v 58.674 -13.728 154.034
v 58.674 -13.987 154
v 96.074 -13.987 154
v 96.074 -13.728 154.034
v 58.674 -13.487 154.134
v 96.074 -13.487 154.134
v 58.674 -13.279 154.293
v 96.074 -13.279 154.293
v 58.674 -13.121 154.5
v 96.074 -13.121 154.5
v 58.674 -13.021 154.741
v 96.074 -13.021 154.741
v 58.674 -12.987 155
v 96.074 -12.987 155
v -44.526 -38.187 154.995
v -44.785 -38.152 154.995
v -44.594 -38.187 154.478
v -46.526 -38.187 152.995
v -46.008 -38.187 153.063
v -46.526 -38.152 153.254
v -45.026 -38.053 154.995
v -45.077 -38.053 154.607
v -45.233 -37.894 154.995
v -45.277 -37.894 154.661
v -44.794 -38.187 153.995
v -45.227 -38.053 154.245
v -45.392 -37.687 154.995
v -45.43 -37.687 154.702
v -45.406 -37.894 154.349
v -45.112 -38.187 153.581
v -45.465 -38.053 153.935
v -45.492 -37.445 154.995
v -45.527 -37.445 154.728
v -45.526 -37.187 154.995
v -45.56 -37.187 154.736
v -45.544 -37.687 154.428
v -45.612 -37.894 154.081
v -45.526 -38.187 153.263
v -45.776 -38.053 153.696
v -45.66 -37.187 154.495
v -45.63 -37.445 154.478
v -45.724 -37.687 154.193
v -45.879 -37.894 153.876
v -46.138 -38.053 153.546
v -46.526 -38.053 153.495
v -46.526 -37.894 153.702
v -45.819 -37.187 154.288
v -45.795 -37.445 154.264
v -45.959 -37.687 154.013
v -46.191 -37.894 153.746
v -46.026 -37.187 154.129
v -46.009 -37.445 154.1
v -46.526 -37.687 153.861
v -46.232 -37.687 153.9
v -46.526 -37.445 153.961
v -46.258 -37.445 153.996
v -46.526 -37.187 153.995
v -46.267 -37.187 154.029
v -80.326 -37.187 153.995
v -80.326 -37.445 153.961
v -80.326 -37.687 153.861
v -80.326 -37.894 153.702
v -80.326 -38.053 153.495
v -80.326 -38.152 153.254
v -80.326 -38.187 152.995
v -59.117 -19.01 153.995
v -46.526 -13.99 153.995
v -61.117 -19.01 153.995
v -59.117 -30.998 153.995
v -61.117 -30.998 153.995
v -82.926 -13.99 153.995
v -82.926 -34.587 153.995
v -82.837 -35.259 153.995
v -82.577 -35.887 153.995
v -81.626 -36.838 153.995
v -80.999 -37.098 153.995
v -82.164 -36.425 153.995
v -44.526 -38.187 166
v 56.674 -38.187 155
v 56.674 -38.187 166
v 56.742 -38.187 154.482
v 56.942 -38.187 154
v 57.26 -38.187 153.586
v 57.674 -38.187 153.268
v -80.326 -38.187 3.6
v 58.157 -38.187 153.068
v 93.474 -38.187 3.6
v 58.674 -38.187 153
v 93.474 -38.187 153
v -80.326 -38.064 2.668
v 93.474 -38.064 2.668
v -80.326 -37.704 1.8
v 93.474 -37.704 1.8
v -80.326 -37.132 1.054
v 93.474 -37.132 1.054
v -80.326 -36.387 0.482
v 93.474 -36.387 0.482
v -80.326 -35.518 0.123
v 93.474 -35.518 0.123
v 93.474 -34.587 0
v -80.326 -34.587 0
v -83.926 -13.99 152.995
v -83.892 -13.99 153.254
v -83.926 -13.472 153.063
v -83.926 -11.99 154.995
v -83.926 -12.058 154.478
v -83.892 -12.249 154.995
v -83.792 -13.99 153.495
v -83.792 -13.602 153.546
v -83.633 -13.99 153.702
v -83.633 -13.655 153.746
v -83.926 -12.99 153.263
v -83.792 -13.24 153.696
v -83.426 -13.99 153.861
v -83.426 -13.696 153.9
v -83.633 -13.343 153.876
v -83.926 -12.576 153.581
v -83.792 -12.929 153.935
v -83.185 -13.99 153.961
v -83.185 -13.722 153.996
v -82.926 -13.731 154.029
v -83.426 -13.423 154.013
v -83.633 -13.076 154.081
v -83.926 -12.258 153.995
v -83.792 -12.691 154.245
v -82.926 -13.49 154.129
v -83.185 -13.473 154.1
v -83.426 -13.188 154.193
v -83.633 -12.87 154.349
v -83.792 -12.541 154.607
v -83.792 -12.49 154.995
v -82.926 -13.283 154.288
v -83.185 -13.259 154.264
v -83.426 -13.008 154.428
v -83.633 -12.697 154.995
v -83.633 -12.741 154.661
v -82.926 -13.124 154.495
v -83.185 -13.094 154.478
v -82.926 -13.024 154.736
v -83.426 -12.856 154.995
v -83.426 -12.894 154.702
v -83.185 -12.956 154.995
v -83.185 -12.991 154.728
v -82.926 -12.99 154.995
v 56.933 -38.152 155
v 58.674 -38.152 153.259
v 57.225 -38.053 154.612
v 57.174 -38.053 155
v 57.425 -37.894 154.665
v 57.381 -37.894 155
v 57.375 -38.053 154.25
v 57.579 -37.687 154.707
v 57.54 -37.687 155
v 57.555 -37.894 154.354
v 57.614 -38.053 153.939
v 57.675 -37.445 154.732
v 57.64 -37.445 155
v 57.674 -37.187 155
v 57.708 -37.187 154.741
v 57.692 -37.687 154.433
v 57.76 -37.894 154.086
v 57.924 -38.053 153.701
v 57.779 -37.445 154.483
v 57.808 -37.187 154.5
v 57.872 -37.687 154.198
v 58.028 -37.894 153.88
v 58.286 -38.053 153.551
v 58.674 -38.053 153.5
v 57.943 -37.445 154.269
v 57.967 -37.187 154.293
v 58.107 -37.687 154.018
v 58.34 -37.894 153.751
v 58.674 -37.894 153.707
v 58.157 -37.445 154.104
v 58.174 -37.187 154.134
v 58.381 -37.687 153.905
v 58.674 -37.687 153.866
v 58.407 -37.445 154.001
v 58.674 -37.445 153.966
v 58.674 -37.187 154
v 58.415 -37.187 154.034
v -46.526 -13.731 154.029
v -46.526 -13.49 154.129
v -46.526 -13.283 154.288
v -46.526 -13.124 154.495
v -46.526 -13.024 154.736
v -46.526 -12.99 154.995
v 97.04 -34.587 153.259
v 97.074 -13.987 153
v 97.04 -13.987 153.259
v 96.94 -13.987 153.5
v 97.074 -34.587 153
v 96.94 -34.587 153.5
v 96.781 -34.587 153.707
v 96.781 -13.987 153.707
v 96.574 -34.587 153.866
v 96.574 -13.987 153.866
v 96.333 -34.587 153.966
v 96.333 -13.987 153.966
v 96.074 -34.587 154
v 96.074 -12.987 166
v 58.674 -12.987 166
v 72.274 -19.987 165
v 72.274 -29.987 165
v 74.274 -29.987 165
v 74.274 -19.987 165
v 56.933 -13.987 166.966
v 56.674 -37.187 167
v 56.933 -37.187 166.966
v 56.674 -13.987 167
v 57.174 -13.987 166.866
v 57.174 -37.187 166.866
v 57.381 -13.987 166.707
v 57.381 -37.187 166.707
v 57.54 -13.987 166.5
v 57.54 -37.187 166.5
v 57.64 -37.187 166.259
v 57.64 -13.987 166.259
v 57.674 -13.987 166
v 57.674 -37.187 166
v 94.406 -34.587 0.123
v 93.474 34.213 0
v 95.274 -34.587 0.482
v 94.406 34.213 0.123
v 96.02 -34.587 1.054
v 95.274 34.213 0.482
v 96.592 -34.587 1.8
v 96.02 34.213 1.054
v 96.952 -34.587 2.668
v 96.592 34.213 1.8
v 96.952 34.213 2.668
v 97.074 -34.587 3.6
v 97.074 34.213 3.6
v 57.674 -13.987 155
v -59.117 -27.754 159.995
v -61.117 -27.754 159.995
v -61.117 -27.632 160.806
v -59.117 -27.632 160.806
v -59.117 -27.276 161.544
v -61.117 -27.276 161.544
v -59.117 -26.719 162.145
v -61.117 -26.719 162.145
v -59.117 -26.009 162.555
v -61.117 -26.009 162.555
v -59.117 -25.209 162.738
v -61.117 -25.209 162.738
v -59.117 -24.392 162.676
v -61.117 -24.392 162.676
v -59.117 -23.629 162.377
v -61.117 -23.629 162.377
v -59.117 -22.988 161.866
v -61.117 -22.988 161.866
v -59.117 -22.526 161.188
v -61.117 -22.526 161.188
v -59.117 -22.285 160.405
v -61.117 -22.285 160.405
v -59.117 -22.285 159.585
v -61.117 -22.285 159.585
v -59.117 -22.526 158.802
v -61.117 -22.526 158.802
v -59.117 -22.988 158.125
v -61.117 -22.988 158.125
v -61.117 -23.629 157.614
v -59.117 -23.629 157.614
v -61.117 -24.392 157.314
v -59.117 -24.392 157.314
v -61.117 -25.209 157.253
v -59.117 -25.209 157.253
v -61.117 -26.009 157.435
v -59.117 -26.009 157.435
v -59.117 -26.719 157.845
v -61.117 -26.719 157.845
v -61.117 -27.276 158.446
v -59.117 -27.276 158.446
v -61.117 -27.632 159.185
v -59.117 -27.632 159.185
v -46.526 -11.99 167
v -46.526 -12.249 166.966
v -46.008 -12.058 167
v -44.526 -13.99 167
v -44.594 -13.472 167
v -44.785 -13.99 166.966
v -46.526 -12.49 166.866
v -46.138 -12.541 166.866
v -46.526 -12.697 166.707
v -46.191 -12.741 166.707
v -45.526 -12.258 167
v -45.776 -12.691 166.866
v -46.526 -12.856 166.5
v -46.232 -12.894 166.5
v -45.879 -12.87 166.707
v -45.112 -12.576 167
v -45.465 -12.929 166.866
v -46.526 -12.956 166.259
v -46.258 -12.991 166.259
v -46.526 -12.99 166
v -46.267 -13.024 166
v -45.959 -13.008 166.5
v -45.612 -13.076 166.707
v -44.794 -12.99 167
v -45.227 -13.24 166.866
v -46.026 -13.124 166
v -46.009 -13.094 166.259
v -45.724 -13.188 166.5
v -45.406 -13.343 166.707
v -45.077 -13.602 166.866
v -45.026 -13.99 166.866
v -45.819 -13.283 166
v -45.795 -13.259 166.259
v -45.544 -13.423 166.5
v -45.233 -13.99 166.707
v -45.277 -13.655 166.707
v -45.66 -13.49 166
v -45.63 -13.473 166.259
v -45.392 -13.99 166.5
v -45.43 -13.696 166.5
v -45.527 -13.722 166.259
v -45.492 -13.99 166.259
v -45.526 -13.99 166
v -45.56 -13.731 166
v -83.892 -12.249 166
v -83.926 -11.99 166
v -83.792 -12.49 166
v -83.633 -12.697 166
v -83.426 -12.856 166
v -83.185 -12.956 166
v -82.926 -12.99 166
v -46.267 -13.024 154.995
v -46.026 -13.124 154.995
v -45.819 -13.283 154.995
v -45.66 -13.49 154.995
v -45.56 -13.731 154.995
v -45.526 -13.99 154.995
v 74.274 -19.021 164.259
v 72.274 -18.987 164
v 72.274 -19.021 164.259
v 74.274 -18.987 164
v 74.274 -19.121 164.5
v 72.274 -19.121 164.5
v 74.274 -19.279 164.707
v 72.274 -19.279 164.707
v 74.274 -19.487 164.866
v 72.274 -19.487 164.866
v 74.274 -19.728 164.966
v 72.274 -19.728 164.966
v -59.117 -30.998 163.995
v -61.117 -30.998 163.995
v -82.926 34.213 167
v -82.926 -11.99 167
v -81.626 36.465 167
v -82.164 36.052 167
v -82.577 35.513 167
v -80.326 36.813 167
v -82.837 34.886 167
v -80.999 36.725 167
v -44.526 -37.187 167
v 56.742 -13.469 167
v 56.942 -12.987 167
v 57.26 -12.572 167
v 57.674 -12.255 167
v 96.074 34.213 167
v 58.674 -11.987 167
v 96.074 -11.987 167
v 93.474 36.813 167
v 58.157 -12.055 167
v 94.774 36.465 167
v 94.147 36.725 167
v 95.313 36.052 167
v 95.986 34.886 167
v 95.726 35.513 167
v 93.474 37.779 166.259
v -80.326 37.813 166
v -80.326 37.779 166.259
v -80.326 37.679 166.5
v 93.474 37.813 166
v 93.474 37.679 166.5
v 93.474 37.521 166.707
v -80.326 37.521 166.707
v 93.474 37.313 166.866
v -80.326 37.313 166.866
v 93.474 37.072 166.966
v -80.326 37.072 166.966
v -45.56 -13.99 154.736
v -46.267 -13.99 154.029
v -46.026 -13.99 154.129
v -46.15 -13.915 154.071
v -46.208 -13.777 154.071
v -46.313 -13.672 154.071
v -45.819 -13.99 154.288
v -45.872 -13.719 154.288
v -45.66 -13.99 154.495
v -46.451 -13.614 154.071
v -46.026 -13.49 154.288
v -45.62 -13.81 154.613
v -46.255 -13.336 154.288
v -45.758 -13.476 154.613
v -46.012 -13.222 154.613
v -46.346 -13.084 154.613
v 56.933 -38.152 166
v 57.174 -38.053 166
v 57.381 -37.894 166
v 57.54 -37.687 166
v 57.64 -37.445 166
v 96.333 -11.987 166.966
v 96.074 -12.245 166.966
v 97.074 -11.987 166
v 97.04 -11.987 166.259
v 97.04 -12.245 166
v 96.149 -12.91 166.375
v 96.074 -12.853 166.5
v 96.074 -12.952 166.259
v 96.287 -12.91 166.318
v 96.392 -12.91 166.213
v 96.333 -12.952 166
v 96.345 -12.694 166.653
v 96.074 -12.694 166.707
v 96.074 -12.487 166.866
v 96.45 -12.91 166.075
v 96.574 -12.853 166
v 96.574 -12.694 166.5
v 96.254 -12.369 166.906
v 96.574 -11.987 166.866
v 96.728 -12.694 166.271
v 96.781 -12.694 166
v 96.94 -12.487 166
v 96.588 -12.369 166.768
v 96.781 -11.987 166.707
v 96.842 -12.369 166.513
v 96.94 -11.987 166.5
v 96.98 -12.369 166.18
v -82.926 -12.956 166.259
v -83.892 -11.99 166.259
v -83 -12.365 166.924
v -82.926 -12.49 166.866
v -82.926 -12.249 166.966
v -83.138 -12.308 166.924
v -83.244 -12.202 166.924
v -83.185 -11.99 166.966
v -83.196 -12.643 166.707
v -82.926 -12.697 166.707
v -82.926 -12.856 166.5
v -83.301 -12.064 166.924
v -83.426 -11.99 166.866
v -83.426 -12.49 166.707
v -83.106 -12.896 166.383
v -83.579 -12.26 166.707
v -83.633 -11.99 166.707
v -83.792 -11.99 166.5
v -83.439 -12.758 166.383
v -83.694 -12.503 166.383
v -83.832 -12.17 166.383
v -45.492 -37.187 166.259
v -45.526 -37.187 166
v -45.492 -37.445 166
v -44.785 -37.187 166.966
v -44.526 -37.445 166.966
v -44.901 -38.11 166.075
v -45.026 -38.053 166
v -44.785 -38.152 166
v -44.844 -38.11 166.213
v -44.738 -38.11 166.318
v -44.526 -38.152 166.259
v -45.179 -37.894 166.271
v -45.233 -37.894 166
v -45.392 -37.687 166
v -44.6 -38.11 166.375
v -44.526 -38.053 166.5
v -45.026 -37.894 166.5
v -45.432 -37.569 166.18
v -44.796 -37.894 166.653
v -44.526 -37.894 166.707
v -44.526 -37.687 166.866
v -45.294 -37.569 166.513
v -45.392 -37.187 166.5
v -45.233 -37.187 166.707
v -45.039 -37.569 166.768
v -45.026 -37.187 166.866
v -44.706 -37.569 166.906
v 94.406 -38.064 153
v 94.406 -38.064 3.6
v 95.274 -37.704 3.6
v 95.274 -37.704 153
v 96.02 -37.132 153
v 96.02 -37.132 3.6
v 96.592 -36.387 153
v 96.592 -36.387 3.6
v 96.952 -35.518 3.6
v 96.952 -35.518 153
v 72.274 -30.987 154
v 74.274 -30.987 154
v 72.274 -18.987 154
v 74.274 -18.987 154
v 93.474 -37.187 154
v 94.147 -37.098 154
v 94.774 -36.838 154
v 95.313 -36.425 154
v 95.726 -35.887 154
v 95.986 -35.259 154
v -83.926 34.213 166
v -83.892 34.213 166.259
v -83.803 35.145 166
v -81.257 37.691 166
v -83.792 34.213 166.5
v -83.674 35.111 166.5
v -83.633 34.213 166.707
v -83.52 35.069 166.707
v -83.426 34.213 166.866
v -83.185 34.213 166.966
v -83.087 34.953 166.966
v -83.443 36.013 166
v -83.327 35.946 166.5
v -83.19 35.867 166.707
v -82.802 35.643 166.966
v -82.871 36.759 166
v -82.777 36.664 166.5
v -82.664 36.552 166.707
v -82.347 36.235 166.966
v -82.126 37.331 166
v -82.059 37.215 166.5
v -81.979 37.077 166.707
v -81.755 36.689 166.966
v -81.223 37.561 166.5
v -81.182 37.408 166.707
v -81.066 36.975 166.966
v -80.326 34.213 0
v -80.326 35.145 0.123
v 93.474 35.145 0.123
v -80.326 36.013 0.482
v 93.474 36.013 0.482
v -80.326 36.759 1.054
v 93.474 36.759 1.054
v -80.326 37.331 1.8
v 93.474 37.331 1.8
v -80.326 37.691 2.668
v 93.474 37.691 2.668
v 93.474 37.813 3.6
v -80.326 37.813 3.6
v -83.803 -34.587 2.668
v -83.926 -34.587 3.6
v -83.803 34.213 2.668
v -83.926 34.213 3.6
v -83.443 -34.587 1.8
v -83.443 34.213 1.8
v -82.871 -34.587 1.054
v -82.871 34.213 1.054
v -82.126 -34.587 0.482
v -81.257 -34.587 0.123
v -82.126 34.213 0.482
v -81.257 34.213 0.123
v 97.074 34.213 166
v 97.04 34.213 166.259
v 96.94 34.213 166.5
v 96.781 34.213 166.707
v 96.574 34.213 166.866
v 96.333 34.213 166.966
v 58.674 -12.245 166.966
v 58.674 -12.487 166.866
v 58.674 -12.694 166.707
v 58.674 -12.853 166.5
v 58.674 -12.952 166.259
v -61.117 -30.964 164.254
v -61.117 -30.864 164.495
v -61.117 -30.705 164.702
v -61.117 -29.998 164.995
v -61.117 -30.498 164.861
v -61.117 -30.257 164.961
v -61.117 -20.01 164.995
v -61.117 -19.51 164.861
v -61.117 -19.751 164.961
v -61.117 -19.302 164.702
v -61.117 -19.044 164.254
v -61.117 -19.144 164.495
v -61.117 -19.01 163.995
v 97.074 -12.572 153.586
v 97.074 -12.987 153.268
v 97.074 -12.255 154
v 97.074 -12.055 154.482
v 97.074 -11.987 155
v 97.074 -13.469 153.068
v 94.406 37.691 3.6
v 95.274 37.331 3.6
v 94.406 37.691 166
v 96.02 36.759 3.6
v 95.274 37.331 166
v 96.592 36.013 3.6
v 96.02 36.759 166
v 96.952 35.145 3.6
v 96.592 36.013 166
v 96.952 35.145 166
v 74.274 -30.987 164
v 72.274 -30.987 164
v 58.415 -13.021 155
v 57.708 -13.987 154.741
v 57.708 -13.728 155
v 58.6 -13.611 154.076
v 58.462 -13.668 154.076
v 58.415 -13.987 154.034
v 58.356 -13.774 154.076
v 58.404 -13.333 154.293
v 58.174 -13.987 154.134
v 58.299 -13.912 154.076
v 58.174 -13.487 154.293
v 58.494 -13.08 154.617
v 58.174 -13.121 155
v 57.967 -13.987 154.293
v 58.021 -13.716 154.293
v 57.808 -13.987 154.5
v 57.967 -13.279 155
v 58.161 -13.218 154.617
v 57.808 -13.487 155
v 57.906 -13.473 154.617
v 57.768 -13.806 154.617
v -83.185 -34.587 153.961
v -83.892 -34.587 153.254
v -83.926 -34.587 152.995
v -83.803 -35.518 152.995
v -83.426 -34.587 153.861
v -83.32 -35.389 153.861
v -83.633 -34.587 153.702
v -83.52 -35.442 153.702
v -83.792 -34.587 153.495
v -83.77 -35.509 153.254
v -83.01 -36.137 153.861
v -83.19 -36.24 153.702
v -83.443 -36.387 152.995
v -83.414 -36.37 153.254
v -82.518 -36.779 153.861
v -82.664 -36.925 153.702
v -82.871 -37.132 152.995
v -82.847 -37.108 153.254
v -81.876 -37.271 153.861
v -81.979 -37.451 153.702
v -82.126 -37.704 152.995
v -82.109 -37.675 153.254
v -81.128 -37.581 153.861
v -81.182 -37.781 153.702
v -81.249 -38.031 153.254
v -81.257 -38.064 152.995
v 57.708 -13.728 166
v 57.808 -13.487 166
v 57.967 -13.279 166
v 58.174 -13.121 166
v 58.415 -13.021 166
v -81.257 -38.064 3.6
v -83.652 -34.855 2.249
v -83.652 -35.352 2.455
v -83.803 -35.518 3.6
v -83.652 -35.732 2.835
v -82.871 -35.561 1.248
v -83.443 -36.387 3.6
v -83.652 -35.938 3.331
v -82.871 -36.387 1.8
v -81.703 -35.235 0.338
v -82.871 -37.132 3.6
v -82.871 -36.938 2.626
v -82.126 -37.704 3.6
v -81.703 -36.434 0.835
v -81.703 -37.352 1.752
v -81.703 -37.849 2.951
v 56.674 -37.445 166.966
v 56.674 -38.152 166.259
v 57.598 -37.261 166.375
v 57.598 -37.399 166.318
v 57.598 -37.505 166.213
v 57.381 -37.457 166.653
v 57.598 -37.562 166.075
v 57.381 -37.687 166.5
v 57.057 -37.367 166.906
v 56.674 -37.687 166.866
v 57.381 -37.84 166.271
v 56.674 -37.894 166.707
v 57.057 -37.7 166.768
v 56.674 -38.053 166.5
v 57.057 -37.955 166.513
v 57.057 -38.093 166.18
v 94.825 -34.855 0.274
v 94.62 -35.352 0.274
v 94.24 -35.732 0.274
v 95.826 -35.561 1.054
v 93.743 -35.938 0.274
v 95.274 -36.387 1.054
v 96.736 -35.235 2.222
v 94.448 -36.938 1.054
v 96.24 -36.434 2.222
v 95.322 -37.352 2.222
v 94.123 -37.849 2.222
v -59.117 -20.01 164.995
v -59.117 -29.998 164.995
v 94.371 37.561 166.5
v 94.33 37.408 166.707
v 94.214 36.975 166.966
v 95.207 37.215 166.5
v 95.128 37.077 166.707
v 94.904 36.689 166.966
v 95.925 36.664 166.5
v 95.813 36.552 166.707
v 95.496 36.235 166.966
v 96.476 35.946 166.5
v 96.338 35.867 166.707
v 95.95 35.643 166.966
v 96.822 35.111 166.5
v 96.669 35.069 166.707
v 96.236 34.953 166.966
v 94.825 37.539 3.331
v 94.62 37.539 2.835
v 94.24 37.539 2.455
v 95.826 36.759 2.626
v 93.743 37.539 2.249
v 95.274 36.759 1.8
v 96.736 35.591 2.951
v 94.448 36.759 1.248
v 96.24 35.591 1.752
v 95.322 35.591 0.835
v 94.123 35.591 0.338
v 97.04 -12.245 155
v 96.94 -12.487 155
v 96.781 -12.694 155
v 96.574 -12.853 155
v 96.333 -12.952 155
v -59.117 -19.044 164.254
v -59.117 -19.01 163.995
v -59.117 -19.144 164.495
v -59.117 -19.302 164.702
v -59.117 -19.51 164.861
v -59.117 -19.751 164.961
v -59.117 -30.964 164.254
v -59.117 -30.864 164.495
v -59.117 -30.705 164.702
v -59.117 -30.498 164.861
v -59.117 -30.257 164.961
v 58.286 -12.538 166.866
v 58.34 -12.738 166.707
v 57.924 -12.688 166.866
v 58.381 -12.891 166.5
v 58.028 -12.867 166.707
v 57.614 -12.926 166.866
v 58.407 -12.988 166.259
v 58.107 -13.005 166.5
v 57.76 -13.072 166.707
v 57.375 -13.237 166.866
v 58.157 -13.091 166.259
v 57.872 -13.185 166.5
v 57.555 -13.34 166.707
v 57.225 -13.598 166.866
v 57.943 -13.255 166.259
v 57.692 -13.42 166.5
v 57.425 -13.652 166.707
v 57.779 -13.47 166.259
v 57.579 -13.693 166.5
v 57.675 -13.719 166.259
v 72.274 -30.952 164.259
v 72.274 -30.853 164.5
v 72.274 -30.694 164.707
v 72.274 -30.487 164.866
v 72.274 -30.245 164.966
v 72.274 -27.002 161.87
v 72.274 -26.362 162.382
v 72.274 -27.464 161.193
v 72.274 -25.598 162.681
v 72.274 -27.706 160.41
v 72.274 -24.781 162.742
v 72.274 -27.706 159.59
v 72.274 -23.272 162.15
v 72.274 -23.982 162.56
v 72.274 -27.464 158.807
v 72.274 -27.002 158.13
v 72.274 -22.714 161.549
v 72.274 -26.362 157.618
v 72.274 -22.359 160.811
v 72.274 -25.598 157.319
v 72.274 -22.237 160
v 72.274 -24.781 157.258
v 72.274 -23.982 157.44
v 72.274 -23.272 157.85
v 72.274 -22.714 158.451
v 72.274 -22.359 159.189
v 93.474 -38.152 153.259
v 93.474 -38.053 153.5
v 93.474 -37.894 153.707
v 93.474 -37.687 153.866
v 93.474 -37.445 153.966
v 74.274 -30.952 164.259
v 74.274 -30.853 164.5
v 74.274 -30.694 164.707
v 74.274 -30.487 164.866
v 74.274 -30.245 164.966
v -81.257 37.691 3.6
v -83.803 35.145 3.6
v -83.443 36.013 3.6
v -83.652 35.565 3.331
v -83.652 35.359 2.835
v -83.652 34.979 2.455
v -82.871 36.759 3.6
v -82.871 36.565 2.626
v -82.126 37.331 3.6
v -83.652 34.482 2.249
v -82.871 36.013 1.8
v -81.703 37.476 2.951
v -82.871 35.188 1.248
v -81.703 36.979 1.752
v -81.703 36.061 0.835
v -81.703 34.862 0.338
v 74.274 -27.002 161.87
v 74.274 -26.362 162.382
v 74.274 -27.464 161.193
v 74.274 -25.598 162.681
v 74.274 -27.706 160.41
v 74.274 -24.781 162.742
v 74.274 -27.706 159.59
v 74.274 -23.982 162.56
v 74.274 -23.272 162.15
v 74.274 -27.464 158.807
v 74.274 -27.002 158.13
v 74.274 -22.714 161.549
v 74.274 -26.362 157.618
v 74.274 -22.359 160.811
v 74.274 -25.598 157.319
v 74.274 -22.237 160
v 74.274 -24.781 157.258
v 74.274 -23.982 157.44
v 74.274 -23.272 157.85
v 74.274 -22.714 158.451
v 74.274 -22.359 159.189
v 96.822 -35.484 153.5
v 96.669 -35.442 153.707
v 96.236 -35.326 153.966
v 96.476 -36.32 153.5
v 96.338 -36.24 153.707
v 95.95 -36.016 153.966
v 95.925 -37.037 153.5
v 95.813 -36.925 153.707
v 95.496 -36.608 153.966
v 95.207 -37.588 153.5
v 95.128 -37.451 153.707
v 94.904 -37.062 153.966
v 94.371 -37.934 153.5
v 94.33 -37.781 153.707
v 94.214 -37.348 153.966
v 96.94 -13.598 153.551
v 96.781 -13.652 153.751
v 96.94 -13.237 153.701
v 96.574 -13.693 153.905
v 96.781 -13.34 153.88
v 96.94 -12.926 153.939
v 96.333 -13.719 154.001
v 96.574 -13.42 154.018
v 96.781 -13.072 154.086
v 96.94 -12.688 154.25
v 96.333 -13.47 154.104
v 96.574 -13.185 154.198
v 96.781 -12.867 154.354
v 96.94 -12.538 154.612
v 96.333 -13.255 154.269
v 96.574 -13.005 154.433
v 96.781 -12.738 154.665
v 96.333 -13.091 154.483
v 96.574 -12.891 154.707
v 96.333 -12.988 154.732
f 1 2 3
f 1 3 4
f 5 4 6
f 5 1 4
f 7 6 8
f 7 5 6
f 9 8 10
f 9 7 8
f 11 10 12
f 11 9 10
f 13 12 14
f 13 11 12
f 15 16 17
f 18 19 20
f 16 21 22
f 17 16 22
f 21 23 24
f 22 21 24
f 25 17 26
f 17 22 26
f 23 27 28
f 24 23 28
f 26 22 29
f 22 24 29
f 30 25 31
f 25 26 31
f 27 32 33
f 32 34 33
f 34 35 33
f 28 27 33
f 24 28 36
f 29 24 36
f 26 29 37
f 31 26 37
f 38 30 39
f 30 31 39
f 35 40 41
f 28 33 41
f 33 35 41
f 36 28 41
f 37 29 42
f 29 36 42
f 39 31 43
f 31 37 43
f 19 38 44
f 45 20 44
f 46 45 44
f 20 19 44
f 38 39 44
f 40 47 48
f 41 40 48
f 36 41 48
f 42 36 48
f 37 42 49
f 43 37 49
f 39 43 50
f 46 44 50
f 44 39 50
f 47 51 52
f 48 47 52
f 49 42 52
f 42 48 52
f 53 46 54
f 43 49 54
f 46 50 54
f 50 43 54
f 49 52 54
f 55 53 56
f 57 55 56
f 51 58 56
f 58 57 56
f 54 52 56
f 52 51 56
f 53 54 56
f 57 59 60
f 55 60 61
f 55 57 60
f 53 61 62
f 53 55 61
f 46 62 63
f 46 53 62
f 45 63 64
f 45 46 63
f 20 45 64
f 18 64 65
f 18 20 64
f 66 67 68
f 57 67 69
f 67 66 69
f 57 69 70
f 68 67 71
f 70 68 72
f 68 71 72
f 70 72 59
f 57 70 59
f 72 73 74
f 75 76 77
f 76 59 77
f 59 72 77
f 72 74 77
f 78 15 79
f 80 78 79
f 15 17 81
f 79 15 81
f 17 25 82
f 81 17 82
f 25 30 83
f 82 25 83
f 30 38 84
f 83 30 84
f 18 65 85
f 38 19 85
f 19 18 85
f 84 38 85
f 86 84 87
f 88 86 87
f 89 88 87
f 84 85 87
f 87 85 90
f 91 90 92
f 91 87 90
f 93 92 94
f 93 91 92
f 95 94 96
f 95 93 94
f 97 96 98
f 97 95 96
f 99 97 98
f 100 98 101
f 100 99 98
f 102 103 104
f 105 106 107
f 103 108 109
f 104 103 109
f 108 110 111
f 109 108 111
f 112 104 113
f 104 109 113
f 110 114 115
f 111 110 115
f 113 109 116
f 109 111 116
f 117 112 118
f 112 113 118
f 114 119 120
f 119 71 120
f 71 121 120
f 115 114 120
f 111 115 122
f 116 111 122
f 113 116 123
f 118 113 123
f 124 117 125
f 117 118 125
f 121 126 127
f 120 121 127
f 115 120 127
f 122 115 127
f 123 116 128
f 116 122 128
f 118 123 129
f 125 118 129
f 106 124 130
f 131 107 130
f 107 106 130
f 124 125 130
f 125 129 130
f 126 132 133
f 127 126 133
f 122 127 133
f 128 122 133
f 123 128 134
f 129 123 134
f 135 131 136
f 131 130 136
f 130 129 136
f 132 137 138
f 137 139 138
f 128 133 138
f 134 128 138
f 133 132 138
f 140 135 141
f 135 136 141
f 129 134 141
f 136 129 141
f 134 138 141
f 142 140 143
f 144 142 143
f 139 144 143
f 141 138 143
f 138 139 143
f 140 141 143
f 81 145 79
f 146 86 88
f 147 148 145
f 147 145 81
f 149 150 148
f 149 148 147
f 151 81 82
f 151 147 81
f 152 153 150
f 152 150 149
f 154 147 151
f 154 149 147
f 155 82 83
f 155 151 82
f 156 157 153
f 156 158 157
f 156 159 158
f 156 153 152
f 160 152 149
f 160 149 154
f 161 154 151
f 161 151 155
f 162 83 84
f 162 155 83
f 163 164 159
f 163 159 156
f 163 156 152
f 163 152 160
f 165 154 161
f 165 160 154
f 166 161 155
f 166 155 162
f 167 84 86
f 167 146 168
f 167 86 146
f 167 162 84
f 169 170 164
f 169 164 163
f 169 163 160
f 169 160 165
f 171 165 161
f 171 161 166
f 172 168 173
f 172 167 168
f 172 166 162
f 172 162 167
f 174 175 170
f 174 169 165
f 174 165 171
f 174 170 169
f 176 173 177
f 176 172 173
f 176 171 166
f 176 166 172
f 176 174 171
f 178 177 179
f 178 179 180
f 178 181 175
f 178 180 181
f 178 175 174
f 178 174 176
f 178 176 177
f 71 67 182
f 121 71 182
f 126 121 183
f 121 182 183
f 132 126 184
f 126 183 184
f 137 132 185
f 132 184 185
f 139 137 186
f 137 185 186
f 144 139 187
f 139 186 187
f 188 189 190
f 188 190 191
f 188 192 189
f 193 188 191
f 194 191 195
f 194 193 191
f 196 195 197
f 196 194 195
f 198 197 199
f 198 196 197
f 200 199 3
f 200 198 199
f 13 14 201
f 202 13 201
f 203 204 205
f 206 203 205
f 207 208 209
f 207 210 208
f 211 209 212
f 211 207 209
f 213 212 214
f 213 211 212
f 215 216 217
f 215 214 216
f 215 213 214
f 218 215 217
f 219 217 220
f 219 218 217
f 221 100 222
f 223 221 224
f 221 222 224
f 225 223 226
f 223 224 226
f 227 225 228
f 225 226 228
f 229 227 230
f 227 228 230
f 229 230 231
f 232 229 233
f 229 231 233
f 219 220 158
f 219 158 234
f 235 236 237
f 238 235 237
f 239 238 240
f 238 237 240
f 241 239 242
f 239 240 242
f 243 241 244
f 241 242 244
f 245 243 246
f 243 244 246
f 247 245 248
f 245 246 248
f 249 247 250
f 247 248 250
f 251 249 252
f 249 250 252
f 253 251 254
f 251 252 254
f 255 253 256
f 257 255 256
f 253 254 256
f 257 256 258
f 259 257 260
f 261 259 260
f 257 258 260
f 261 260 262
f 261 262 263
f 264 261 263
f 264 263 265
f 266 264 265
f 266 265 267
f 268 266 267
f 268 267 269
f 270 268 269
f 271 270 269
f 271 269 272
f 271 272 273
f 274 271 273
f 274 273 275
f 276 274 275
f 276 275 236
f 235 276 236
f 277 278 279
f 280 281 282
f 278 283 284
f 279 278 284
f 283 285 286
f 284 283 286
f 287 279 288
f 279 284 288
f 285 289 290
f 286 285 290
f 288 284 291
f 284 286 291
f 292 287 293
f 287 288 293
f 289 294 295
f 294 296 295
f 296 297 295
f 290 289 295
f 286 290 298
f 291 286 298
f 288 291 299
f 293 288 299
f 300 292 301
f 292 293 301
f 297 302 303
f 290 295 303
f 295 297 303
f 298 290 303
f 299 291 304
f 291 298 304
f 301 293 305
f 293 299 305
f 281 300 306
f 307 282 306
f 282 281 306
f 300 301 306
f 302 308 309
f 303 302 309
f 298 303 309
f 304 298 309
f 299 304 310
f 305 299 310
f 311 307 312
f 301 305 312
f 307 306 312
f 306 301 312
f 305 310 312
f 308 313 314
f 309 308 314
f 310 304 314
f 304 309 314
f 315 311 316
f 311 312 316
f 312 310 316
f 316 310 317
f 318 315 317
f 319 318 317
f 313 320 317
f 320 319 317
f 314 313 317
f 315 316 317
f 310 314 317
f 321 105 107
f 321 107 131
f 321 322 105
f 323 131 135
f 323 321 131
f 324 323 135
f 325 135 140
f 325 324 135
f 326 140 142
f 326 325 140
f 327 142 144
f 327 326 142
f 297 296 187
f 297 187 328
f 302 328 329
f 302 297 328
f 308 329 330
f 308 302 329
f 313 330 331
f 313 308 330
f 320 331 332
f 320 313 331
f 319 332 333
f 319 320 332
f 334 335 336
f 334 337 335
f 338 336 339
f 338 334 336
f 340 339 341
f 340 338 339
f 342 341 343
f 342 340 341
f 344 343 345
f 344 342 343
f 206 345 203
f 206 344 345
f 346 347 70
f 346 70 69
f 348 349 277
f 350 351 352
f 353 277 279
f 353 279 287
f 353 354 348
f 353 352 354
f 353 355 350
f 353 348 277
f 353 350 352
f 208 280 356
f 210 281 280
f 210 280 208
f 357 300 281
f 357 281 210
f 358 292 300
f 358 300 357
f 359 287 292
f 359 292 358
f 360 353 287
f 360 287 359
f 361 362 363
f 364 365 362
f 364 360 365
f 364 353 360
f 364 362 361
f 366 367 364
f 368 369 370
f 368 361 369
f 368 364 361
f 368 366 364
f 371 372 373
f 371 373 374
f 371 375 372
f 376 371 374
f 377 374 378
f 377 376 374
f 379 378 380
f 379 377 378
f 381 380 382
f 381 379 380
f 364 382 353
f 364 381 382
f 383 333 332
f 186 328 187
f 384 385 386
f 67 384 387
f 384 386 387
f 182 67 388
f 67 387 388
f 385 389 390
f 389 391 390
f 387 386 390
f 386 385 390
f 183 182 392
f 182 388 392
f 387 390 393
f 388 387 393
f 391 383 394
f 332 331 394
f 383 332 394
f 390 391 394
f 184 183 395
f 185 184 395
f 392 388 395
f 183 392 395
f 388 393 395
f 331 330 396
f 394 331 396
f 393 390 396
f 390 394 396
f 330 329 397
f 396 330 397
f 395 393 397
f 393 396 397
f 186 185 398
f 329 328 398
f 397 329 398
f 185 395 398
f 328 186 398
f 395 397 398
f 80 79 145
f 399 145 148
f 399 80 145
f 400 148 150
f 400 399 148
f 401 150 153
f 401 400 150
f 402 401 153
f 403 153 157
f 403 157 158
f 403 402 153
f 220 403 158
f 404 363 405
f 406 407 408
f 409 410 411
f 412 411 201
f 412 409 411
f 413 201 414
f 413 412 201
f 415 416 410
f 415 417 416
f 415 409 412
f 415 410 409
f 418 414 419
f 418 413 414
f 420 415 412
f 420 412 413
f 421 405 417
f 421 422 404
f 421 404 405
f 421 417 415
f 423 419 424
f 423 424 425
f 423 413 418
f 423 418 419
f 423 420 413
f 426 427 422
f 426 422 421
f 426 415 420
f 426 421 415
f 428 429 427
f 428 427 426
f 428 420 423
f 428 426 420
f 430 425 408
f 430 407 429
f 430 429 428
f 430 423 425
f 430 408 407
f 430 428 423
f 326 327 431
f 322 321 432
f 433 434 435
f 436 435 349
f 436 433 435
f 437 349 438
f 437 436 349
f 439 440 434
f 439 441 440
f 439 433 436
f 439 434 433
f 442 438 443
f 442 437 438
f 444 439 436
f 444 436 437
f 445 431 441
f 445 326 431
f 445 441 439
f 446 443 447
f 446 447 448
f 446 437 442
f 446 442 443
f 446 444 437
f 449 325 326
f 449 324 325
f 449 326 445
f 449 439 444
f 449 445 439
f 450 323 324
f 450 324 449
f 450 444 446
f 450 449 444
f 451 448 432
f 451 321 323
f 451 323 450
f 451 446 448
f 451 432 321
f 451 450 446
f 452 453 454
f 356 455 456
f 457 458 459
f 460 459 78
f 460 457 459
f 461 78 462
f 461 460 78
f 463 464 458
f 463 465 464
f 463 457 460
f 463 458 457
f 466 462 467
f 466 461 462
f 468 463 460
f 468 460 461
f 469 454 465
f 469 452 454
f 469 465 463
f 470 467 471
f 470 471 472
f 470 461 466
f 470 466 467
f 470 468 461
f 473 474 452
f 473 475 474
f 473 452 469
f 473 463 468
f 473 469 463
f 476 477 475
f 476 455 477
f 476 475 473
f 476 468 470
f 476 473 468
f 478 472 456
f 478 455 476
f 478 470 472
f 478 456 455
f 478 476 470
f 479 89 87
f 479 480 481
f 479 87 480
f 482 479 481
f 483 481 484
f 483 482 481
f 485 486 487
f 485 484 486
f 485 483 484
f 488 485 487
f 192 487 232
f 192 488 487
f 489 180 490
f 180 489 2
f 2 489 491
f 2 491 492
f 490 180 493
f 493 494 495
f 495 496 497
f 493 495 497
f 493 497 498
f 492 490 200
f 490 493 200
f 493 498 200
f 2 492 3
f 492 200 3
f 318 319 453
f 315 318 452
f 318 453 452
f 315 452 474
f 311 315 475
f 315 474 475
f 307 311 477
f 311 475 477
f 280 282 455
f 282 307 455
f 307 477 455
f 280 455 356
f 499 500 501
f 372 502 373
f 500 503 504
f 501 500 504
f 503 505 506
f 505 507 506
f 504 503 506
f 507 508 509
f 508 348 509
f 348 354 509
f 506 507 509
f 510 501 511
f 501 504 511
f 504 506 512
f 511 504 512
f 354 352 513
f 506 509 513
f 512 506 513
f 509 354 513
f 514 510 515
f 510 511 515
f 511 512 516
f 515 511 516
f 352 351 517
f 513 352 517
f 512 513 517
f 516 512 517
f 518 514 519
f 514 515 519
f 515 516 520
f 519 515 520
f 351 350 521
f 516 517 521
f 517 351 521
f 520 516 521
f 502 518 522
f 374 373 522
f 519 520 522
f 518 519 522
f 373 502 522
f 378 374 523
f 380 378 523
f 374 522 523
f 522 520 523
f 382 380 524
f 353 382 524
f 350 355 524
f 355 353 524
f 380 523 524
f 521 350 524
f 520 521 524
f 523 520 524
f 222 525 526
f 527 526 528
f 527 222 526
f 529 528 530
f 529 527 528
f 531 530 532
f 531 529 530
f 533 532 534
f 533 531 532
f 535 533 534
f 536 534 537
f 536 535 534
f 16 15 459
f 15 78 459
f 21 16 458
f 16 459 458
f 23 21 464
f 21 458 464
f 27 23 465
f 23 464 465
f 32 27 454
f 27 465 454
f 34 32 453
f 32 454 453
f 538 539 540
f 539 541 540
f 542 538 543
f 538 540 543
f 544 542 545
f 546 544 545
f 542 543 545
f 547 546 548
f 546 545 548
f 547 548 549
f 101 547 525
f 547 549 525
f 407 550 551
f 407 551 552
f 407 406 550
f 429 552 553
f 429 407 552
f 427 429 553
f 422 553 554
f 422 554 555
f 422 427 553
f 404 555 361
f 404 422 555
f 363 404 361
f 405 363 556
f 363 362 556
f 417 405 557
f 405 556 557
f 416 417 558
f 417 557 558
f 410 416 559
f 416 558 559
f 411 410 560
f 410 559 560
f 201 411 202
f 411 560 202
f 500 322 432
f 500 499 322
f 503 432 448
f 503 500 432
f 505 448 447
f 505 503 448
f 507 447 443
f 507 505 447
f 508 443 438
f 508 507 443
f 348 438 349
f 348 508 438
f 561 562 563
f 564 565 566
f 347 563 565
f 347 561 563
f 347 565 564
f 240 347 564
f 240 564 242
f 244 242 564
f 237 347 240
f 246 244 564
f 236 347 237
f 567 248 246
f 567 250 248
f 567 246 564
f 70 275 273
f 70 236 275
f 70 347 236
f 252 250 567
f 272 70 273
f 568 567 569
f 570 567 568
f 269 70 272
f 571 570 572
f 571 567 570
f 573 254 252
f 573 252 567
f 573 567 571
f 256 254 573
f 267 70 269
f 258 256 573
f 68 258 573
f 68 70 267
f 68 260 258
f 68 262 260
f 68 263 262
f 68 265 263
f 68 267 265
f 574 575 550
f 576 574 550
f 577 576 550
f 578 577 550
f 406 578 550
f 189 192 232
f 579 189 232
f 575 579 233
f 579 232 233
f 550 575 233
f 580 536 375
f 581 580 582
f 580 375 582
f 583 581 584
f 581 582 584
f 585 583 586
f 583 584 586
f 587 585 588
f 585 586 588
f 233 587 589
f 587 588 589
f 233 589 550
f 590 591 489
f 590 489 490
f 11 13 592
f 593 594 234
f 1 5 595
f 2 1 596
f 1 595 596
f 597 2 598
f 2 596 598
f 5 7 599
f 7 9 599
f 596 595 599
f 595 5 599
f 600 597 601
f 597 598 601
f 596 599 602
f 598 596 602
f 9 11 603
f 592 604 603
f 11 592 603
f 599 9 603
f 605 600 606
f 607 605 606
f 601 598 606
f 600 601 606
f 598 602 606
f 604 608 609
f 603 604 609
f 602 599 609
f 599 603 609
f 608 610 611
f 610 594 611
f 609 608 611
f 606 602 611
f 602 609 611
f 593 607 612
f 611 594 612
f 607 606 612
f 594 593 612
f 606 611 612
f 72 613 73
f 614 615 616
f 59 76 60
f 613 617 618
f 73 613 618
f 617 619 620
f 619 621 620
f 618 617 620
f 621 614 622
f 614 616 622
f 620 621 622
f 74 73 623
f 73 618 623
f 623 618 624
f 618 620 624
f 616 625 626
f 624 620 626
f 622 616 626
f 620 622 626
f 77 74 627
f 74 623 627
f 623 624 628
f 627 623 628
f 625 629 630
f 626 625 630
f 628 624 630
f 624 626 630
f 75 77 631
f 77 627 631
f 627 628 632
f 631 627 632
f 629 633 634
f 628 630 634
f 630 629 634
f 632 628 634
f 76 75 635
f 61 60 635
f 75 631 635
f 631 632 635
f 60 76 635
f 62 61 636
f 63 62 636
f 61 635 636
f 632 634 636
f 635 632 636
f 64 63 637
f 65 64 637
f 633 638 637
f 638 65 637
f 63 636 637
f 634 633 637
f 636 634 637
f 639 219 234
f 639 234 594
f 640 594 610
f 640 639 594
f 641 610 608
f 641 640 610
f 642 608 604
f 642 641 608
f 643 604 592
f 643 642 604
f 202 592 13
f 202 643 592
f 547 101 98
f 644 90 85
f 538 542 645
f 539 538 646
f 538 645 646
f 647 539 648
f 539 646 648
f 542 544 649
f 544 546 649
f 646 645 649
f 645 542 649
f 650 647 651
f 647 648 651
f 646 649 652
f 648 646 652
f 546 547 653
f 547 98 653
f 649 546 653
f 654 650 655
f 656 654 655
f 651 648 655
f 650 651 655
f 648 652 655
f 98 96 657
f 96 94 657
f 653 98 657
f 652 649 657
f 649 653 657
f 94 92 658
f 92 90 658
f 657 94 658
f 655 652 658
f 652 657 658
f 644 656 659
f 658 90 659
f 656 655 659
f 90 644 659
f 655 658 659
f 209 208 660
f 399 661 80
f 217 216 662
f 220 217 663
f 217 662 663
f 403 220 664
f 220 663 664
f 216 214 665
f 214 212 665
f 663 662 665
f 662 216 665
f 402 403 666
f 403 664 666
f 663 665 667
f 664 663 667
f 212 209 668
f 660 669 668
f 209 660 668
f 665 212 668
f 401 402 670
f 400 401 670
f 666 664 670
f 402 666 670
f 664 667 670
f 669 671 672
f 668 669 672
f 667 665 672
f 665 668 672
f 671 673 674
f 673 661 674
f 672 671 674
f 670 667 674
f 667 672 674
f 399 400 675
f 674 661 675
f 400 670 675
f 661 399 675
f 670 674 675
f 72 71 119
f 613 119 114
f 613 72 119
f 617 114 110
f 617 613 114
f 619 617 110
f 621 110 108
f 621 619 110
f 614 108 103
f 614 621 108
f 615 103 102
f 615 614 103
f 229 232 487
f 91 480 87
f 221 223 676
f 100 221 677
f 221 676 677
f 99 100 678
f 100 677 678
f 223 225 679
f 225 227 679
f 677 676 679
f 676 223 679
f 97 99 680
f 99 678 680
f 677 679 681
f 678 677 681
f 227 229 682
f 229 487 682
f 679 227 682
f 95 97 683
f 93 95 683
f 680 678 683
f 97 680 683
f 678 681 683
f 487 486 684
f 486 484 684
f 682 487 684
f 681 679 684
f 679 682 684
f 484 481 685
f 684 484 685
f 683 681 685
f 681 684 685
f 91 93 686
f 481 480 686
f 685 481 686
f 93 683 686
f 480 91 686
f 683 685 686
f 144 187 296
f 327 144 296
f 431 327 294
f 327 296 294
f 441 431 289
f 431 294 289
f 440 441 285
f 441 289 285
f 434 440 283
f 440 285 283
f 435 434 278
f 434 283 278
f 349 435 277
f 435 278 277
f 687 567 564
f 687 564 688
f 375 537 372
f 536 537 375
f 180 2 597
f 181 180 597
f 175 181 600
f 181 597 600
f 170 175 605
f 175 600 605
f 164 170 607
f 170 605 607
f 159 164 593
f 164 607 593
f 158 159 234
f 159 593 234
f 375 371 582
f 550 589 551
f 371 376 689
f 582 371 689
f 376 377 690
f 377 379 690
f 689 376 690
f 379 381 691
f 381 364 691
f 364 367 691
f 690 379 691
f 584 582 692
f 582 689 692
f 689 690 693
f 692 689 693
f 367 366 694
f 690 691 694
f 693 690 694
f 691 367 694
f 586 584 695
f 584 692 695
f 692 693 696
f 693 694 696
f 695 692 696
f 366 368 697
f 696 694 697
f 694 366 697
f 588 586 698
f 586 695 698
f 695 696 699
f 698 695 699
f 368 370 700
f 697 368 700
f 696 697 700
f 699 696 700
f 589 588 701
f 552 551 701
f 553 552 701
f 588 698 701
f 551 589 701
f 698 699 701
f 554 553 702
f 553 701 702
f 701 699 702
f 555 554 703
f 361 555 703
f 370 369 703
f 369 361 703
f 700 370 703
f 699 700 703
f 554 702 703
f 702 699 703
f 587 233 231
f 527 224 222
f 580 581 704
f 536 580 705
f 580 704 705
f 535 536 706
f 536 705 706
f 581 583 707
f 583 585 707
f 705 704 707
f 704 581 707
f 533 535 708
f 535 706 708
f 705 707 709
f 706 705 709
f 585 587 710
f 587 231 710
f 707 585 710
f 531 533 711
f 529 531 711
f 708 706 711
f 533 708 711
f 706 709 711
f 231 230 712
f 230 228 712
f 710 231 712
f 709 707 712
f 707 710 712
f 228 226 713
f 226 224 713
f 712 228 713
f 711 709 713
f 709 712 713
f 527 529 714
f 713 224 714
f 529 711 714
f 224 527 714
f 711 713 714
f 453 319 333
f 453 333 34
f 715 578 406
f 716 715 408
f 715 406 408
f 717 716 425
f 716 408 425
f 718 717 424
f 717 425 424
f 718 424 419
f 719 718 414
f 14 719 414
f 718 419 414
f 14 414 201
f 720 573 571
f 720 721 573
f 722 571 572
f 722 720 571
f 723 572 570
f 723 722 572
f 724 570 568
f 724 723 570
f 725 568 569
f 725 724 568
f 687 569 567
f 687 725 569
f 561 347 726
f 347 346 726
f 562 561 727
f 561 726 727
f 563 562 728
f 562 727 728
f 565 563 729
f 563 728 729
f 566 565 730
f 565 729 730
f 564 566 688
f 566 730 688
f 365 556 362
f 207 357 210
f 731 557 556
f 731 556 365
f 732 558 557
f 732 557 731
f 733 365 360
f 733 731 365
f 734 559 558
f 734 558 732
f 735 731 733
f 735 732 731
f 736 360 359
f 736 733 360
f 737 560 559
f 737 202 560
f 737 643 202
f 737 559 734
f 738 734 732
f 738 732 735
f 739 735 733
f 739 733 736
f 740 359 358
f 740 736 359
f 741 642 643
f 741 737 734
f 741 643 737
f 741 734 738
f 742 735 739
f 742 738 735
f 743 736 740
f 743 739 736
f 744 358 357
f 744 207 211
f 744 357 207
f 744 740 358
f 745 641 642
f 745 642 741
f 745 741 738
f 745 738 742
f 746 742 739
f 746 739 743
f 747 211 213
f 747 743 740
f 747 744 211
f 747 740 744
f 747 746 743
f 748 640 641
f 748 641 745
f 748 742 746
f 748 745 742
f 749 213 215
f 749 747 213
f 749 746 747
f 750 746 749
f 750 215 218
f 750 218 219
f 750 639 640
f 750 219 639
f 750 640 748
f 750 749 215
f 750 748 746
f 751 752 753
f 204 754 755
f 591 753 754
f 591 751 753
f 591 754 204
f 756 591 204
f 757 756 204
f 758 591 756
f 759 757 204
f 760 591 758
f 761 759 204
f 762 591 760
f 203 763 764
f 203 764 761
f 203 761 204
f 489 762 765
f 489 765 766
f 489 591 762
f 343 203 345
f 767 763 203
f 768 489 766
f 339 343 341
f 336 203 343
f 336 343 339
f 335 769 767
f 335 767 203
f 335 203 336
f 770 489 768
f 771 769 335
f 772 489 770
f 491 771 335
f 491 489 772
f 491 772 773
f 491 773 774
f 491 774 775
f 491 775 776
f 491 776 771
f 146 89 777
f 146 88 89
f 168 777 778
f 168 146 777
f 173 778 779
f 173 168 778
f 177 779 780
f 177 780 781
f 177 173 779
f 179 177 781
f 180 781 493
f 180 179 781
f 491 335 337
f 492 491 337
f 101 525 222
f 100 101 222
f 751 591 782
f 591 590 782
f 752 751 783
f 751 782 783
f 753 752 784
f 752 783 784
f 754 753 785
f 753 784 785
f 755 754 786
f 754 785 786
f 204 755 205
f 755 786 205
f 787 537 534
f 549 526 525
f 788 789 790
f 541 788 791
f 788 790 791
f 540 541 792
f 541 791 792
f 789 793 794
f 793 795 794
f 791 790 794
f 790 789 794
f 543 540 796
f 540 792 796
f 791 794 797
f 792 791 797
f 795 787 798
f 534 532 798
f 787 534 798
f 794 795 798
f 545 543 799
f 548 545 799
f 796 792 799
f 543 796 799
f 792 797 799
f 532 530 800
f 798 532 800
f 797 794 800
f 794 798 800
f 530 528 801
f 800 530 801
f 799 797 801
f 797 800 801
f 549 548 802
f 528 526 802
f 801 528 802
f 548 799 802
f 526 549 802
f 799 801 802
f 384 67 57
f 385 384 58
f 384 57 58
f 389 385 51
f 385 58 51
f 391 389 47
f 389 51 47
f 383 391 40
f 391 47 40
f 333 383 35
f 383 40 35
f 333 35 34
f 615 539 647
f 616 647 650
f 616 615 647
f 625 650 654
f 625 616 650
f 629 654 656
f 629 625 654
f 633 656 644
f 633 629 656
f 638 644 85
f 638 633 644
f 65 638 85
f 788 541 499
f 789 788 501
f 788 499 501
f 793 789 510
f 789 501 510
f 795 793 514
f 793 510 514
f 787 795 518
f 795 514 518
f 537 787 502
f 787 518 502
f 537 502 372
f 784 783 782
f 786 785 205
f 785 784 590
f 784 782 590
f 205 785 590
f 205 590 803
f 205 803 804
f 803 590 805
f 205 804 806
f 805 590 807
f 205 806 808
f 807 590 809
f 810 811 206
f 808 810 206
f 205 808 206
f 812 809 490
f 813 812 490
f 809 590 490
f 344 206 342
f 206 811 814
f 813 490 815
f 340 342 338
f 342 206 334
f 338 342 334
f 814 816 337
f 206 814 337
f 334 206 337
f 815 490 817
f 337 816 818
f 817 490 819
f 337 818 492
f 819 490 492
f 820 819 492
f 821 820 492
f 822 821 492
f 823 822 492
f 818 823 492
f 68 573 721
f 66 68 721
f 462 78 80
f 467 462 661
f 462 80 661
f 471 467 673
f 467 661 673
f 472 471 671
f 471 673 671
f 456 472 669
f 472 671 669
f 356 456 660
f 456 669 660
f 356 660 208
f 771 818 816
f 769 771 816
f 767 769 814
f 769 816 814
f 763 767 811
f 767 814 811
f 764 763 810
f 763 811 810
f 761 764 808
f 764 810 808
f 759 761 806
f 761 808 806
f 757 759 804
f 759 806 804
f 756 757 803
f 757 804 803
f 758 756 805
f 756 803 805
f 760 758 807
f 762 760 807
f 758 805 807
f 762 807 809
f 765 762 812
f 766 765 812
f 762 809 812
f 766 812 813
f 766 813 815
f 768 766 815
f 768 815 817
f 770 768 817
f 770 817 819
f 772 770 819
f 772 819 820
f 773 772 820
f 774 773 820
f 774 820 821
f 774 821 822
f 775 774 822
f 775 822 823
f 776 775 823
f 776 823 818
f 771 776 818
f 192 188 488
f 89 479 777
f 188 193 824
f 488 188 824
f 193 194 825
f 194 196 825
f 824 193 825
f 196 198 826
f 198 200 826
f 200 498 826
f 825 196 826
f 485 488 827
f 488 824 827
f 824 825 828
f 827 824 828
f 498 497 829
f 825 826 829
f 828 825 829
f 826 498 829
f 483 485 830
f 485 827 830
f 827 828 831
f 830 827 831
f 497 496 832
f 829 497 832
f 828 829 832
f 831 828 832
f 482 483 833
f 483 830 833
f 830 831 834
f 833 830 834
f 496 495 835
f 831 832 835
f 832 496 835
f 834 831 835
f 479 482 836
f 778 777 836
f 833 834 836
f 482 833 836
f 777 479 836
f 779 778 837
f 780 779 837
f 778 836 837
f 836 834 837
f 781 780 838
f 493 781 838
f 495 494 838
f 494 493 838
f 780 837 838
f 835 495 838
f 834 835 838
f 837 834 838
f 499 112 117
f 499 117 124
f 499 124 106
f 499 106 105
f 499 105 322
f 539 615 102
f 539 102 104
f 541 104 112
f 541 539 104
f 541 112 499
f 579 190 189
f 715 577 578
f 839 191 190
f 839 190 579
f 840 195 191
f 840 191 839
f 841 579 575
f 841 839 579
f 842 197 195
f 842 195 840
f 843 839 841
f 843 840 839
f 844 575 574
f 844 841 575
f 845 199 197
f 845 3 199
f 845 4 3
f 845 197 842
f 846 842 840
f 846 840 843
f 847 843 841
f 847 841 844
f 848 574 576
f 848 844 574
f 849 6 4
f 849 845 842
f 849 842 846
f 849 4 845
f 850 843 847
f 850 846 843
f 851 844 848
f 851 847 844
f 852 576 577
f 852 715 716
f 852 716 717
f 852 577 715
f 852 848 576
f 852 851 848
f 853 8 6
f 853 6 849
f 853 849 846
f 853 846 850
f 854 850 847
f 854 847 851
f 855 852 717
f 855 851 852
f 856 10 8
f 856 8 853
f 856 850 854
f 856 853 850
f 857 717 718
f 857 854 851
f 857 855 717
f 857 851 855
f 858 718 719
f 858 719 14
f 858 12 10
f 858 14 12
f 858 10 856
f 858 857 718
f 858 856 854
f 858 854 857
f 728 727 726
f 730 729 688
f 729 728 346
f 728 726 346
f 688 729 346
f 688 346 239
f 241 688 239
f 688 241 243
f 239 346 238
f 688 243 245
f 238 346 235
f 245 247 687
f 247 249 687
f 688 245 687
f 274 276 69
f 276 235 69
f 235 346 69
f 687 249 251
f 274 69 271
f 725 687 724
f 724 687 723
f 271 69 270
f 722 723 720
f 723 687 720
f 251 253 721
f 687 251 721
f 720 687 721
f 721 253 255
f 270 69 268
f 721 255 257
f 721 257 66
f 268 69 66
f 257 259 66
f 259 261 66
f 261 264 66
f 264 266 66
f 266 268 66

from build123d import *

# Parameters (mm, degrees)
F0_W      = 181
F0_H      = 76
F1_DEPTH  = 167
F2_W      = 25.2
F2_H      = 13
F3_DEPTH  = 39.4
F4_W      = 25.1968
F4_H      = 13.0048
F5_DEPTH  = 38.4
F6_W      = 2
F6_H      = 12
F7_DEPTH  = 11
F8_R      = 1
F9_R      = 2.75
F10_DEPTH = 3
F11_W     = 2
F11_H     = 11.9888
F12_DEPTH = 11
F13_R     = 1
F14_R     = 2.75
F15_DEPTH = 3
F16_R     = 3.6
F17_R     = 1


with BuildPart() as f1:
    # F0 (on Top) → F1 (new body)
    with BuildSketch(Plane.XY):
        with Locations((6.5742507577, -0.1865534149)):
            Rectangle(F0_W, F0_H)
    extrude(amount=F1_DEPTH)

    # F2 (on face) → F3 (cut)
    with BuildSketch(Plane.YZ.offset(97.0742507577)):
        with Locations((-25.5865534149, 160.5)):
            Rectangle(F2_W, F2_H)
    extrude(amount=-F3_DEPTH, mode=Mode.SUBTRACT)

    # F4 (on face) → F5 (cut)
    with BuildSketch(Plane(origin=(-83.9257492423, 0, 0), x_dir=(0, -1, 0), z_dir=(-1, 0, 0))):
        with Locations((25.5881534149, 160.4976)):
            Rectangle(F4_W, F4_H)
    extrude(amount=-F5_DEPTH, mode=Mode.SUBTRACT)

    # F6 (on face) → F7 (join)
    with BuildSketch(Plane.XY.offset(154)):
        with Locations((73.2742507577, -24.9865534149)):
            Rectangle(F6_W, F6_H)
    extrude(amount=F7_DEPTH)

    # F8
    f8_edges = [f1.edges().sort_by_distance(p)[0] for p in [
        (73.274251, -30.986553, 165),
        (73.274251, -18.986553, 165),
    ]]
    fillet(f8_edges, radius=F8_R)

    # F9 (on face) → F10 (cut)
    with BuildSketch(Plane.YZ.offset(74.2742507577)):
        with Locations((-24.9865534149, 160)):
            Circle(F9_R)
    extrude(amount=-F10_DEPTH, mode=Mode.SUBTRACT)

    # F11 (on face) → F12 (join)
    with BuildSketch(Plane.XY.offset(153.9952)):
        with Locations((-60.1165492423, -25.0039534149)):
            Rectangle(F11_W, F11_H)
    extrude(amount=F12_DEPTH)

    # F13
    f13_edges = [f1.edges().sort_by_distance(p)[0] for p in [
        (-60.116549, -30.998353, 164.9952),
        (-60.116549, -19.009553, 164.9952),
    ]]
    fillet(f13_edges, radius=F13_R)

    # F14 (on face) → F15 (cut)
    with BuildSketch(Plane(origin=(-61.1165492423, 0, 0), x_dir=(0, -1, 0), z_dir=(-1, 0, 0))):
        with Locations((25.0039534149, 159.9952)):
            Circle(F14_R)
    extrude(amount=-F15_DEPTH, mode=Mode.SUBTRACT)

    # F16
    f16_edges = [f1.edges().sort_by_distance(p)[0] for p in [
        (97.074251, -38.186553, 77),
        (97.074251, -0.186553, 0),
        (97.074251, 37.813447, 83.5),
        (6.574251, 37.813447, 0),
        (6.574251, -38.186553, 0),
        (-83.925749, 37.813447, 83.5),
        (-83.925749, -0.186553, 0),
        (-83.925749, -38.186553, 76.9976),
    ]]
    fillet(f16_edges, radius=F16_R)

    # F17
    f17_edges = [f1.edges().sort_by_distance(p)[0] for p in [
        (-62.925749, -38.186553, 153.9952),
        (-83.925749, -23.788153, 153.9952),
        (-83.925749, -12.989753, 160.4976),
        (-64.725749, -12.989753, 167),
        (-45.525749, -25.588153, 167),
        (-45.525749, -12.989753, 160.4976),
        (-45.525749, -25.588153, 153.9952),
        (-64.725749, -12.989753, 153.9952),
        (-45.525749, -38.186553, 160.4976),
        (6.074251, -38.186553, 167),
        (-83.925749, 10.611847, 167),
        (77.374251, -12.986553, 167),
        (57.674251, -25.586553, 167),
        (57.674251, -12.986553, 160.5),
        (77.374251, -12.986553, 154),
        (57.674251, -25.586553, 154),
        (57.674251, -38.186553, 160.5),
        (75.574251, -38.186553, 154),
        (97.074251, -12.986553, 160.5),
        (97.074251, -23.786553, 154),
    ]]
    fillet(f17_edges, radius=F17_R)


solid = f1.part
